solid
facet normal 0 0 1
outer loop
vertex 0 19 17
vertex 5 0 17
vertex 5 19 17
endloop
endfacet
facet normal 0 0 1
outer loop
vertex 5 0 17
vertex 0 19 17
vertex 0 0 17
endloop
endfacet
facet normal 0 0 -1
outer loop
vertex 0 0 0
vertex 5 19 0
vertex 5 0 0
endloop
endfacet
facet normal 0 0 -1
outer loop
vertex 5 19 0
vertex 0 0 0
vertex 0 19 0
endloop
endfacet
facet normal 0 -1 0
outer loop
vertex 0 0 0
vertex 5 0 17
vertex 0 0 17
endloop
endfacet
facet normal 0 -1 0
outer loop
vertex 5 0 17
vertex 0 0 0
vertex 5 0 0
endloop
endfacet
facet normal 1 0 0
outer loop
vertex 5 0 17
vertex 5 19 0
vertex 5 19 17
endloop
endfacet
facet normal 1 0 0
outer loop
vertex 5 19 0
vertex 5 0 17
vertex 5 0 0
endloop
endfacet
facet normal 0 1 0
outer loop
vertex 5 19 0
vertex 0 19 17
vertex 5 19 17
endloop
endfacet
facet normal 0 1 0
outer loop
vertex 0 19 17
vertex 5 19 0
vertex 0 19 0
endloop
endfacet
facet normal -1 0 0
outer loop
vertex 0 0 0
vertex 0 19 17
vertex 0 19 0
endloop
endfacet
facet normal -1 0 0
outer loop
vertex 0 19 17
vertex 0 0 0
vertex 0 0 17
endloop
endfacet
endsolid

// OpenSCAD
// Generated by SolidPython 1.0.1 on 2020-07-29 00:46:54


cube(size = [5, 19, 17]);
/***********************************************
*********      SolidPython code:      **********
************************************************
 
# import packages: SolidPython
from solid import *
from solid.utils import *
from itertools import chain, combinations, permutations


class Resize:

    def __init__(self, scad_file):
        self.scad_file = scad_file
        #self.scad_file = import_scad(scad_file)
        # cone/cylinder param:
        self.r1 = 0
        self.r2 = 0
        self.h = 0
        # rectangular prism param:
        self.w = 0
        self.l = 0
        # ellipse param:
        self.r = 0

    # import OpenScad code (file name corresponds to shape)


    # classify shape + parameters
    def assign(self, param1, param2, param3):
        if self.scad_file == 'cone.scad':
            self.r1 = param1
            self.r2 = param2
            self.h = param3
        elif self.scad_file == 'cylinder.scad':
            self.r1 = param1
            self.r2 = param2
            self.h = param3
        elif self.scad_file == 'rectangularPrism.scad':
            self.h = param1
            self.l = param2
            self.w = param3
        else:
            self.r = param1
            self.h = param2

    # resize parameters
    def iterate(self):
        x = range(3, 20, 2)
        i = 1
        if self.scad_file == 'cone.scad':
            tempList = list(permutations(x, 2))
            for temp in tempList:
                param1 = temp[0]
                param2 = temp[1]
                filepath = 'produced_scad_files/' + 'cone' + str(param1) + '_' + str(param2) + '_' + '.scad'
                scad_render_to_file(cylinder(h=param1, r1=param2, r2=0), filepath)

        elif self.scad_file == 'cylinder.scad':
            tempList = list(permutations(x, 3))
            for temp in tempList:
                param1 = temp[0]
                param2 = temp[1]
                filepath = 'produced_scad_files/' + 'cylinder' + str(param1) + '_' + str(param2) + '_' + '.scad'
                scad_render_to_file(cylinder(h=param1, r1=param2, r2=param2), filepath)

        elif self.scad_file == 'rectangularPrism.scad':
            tempList = list(permutations(x, 3))
            for temp in tempList:
                param1 = temp[0]
                param2 = temp[1]
                param3 = temp[2]
                filepath = 'produced_scad_files/' + 'rectangularPrism' + str(param1) + '_' + str(param2) + '_' + str(
                    param3) + '.scad'
                scad_render_to_file(cube(size=(param1, param2, param3)), filepath)

        elif self.scad_file == 'ellipse.scad':
            tempList = list(permutations(x, 4))
            for temp in tempList:
                param1 = temp[0]
                param2 = temp[1]
                param3 = temp[2]
                param4 = temp[3]
                filepath = 'produced_scad_files/' + 'ellipse' + str(param1) + '_' + str(param2) + '_' + str(param3) + '_' + str(param4) + '.scad'
                scad_render_to_file(scale([param1, param2, param3])(sphere(r=param4)), filepath)

    def render_to_scadfile(self):
        scad_render_to_file(scad, 'example.scad') 
 
************************************************/
